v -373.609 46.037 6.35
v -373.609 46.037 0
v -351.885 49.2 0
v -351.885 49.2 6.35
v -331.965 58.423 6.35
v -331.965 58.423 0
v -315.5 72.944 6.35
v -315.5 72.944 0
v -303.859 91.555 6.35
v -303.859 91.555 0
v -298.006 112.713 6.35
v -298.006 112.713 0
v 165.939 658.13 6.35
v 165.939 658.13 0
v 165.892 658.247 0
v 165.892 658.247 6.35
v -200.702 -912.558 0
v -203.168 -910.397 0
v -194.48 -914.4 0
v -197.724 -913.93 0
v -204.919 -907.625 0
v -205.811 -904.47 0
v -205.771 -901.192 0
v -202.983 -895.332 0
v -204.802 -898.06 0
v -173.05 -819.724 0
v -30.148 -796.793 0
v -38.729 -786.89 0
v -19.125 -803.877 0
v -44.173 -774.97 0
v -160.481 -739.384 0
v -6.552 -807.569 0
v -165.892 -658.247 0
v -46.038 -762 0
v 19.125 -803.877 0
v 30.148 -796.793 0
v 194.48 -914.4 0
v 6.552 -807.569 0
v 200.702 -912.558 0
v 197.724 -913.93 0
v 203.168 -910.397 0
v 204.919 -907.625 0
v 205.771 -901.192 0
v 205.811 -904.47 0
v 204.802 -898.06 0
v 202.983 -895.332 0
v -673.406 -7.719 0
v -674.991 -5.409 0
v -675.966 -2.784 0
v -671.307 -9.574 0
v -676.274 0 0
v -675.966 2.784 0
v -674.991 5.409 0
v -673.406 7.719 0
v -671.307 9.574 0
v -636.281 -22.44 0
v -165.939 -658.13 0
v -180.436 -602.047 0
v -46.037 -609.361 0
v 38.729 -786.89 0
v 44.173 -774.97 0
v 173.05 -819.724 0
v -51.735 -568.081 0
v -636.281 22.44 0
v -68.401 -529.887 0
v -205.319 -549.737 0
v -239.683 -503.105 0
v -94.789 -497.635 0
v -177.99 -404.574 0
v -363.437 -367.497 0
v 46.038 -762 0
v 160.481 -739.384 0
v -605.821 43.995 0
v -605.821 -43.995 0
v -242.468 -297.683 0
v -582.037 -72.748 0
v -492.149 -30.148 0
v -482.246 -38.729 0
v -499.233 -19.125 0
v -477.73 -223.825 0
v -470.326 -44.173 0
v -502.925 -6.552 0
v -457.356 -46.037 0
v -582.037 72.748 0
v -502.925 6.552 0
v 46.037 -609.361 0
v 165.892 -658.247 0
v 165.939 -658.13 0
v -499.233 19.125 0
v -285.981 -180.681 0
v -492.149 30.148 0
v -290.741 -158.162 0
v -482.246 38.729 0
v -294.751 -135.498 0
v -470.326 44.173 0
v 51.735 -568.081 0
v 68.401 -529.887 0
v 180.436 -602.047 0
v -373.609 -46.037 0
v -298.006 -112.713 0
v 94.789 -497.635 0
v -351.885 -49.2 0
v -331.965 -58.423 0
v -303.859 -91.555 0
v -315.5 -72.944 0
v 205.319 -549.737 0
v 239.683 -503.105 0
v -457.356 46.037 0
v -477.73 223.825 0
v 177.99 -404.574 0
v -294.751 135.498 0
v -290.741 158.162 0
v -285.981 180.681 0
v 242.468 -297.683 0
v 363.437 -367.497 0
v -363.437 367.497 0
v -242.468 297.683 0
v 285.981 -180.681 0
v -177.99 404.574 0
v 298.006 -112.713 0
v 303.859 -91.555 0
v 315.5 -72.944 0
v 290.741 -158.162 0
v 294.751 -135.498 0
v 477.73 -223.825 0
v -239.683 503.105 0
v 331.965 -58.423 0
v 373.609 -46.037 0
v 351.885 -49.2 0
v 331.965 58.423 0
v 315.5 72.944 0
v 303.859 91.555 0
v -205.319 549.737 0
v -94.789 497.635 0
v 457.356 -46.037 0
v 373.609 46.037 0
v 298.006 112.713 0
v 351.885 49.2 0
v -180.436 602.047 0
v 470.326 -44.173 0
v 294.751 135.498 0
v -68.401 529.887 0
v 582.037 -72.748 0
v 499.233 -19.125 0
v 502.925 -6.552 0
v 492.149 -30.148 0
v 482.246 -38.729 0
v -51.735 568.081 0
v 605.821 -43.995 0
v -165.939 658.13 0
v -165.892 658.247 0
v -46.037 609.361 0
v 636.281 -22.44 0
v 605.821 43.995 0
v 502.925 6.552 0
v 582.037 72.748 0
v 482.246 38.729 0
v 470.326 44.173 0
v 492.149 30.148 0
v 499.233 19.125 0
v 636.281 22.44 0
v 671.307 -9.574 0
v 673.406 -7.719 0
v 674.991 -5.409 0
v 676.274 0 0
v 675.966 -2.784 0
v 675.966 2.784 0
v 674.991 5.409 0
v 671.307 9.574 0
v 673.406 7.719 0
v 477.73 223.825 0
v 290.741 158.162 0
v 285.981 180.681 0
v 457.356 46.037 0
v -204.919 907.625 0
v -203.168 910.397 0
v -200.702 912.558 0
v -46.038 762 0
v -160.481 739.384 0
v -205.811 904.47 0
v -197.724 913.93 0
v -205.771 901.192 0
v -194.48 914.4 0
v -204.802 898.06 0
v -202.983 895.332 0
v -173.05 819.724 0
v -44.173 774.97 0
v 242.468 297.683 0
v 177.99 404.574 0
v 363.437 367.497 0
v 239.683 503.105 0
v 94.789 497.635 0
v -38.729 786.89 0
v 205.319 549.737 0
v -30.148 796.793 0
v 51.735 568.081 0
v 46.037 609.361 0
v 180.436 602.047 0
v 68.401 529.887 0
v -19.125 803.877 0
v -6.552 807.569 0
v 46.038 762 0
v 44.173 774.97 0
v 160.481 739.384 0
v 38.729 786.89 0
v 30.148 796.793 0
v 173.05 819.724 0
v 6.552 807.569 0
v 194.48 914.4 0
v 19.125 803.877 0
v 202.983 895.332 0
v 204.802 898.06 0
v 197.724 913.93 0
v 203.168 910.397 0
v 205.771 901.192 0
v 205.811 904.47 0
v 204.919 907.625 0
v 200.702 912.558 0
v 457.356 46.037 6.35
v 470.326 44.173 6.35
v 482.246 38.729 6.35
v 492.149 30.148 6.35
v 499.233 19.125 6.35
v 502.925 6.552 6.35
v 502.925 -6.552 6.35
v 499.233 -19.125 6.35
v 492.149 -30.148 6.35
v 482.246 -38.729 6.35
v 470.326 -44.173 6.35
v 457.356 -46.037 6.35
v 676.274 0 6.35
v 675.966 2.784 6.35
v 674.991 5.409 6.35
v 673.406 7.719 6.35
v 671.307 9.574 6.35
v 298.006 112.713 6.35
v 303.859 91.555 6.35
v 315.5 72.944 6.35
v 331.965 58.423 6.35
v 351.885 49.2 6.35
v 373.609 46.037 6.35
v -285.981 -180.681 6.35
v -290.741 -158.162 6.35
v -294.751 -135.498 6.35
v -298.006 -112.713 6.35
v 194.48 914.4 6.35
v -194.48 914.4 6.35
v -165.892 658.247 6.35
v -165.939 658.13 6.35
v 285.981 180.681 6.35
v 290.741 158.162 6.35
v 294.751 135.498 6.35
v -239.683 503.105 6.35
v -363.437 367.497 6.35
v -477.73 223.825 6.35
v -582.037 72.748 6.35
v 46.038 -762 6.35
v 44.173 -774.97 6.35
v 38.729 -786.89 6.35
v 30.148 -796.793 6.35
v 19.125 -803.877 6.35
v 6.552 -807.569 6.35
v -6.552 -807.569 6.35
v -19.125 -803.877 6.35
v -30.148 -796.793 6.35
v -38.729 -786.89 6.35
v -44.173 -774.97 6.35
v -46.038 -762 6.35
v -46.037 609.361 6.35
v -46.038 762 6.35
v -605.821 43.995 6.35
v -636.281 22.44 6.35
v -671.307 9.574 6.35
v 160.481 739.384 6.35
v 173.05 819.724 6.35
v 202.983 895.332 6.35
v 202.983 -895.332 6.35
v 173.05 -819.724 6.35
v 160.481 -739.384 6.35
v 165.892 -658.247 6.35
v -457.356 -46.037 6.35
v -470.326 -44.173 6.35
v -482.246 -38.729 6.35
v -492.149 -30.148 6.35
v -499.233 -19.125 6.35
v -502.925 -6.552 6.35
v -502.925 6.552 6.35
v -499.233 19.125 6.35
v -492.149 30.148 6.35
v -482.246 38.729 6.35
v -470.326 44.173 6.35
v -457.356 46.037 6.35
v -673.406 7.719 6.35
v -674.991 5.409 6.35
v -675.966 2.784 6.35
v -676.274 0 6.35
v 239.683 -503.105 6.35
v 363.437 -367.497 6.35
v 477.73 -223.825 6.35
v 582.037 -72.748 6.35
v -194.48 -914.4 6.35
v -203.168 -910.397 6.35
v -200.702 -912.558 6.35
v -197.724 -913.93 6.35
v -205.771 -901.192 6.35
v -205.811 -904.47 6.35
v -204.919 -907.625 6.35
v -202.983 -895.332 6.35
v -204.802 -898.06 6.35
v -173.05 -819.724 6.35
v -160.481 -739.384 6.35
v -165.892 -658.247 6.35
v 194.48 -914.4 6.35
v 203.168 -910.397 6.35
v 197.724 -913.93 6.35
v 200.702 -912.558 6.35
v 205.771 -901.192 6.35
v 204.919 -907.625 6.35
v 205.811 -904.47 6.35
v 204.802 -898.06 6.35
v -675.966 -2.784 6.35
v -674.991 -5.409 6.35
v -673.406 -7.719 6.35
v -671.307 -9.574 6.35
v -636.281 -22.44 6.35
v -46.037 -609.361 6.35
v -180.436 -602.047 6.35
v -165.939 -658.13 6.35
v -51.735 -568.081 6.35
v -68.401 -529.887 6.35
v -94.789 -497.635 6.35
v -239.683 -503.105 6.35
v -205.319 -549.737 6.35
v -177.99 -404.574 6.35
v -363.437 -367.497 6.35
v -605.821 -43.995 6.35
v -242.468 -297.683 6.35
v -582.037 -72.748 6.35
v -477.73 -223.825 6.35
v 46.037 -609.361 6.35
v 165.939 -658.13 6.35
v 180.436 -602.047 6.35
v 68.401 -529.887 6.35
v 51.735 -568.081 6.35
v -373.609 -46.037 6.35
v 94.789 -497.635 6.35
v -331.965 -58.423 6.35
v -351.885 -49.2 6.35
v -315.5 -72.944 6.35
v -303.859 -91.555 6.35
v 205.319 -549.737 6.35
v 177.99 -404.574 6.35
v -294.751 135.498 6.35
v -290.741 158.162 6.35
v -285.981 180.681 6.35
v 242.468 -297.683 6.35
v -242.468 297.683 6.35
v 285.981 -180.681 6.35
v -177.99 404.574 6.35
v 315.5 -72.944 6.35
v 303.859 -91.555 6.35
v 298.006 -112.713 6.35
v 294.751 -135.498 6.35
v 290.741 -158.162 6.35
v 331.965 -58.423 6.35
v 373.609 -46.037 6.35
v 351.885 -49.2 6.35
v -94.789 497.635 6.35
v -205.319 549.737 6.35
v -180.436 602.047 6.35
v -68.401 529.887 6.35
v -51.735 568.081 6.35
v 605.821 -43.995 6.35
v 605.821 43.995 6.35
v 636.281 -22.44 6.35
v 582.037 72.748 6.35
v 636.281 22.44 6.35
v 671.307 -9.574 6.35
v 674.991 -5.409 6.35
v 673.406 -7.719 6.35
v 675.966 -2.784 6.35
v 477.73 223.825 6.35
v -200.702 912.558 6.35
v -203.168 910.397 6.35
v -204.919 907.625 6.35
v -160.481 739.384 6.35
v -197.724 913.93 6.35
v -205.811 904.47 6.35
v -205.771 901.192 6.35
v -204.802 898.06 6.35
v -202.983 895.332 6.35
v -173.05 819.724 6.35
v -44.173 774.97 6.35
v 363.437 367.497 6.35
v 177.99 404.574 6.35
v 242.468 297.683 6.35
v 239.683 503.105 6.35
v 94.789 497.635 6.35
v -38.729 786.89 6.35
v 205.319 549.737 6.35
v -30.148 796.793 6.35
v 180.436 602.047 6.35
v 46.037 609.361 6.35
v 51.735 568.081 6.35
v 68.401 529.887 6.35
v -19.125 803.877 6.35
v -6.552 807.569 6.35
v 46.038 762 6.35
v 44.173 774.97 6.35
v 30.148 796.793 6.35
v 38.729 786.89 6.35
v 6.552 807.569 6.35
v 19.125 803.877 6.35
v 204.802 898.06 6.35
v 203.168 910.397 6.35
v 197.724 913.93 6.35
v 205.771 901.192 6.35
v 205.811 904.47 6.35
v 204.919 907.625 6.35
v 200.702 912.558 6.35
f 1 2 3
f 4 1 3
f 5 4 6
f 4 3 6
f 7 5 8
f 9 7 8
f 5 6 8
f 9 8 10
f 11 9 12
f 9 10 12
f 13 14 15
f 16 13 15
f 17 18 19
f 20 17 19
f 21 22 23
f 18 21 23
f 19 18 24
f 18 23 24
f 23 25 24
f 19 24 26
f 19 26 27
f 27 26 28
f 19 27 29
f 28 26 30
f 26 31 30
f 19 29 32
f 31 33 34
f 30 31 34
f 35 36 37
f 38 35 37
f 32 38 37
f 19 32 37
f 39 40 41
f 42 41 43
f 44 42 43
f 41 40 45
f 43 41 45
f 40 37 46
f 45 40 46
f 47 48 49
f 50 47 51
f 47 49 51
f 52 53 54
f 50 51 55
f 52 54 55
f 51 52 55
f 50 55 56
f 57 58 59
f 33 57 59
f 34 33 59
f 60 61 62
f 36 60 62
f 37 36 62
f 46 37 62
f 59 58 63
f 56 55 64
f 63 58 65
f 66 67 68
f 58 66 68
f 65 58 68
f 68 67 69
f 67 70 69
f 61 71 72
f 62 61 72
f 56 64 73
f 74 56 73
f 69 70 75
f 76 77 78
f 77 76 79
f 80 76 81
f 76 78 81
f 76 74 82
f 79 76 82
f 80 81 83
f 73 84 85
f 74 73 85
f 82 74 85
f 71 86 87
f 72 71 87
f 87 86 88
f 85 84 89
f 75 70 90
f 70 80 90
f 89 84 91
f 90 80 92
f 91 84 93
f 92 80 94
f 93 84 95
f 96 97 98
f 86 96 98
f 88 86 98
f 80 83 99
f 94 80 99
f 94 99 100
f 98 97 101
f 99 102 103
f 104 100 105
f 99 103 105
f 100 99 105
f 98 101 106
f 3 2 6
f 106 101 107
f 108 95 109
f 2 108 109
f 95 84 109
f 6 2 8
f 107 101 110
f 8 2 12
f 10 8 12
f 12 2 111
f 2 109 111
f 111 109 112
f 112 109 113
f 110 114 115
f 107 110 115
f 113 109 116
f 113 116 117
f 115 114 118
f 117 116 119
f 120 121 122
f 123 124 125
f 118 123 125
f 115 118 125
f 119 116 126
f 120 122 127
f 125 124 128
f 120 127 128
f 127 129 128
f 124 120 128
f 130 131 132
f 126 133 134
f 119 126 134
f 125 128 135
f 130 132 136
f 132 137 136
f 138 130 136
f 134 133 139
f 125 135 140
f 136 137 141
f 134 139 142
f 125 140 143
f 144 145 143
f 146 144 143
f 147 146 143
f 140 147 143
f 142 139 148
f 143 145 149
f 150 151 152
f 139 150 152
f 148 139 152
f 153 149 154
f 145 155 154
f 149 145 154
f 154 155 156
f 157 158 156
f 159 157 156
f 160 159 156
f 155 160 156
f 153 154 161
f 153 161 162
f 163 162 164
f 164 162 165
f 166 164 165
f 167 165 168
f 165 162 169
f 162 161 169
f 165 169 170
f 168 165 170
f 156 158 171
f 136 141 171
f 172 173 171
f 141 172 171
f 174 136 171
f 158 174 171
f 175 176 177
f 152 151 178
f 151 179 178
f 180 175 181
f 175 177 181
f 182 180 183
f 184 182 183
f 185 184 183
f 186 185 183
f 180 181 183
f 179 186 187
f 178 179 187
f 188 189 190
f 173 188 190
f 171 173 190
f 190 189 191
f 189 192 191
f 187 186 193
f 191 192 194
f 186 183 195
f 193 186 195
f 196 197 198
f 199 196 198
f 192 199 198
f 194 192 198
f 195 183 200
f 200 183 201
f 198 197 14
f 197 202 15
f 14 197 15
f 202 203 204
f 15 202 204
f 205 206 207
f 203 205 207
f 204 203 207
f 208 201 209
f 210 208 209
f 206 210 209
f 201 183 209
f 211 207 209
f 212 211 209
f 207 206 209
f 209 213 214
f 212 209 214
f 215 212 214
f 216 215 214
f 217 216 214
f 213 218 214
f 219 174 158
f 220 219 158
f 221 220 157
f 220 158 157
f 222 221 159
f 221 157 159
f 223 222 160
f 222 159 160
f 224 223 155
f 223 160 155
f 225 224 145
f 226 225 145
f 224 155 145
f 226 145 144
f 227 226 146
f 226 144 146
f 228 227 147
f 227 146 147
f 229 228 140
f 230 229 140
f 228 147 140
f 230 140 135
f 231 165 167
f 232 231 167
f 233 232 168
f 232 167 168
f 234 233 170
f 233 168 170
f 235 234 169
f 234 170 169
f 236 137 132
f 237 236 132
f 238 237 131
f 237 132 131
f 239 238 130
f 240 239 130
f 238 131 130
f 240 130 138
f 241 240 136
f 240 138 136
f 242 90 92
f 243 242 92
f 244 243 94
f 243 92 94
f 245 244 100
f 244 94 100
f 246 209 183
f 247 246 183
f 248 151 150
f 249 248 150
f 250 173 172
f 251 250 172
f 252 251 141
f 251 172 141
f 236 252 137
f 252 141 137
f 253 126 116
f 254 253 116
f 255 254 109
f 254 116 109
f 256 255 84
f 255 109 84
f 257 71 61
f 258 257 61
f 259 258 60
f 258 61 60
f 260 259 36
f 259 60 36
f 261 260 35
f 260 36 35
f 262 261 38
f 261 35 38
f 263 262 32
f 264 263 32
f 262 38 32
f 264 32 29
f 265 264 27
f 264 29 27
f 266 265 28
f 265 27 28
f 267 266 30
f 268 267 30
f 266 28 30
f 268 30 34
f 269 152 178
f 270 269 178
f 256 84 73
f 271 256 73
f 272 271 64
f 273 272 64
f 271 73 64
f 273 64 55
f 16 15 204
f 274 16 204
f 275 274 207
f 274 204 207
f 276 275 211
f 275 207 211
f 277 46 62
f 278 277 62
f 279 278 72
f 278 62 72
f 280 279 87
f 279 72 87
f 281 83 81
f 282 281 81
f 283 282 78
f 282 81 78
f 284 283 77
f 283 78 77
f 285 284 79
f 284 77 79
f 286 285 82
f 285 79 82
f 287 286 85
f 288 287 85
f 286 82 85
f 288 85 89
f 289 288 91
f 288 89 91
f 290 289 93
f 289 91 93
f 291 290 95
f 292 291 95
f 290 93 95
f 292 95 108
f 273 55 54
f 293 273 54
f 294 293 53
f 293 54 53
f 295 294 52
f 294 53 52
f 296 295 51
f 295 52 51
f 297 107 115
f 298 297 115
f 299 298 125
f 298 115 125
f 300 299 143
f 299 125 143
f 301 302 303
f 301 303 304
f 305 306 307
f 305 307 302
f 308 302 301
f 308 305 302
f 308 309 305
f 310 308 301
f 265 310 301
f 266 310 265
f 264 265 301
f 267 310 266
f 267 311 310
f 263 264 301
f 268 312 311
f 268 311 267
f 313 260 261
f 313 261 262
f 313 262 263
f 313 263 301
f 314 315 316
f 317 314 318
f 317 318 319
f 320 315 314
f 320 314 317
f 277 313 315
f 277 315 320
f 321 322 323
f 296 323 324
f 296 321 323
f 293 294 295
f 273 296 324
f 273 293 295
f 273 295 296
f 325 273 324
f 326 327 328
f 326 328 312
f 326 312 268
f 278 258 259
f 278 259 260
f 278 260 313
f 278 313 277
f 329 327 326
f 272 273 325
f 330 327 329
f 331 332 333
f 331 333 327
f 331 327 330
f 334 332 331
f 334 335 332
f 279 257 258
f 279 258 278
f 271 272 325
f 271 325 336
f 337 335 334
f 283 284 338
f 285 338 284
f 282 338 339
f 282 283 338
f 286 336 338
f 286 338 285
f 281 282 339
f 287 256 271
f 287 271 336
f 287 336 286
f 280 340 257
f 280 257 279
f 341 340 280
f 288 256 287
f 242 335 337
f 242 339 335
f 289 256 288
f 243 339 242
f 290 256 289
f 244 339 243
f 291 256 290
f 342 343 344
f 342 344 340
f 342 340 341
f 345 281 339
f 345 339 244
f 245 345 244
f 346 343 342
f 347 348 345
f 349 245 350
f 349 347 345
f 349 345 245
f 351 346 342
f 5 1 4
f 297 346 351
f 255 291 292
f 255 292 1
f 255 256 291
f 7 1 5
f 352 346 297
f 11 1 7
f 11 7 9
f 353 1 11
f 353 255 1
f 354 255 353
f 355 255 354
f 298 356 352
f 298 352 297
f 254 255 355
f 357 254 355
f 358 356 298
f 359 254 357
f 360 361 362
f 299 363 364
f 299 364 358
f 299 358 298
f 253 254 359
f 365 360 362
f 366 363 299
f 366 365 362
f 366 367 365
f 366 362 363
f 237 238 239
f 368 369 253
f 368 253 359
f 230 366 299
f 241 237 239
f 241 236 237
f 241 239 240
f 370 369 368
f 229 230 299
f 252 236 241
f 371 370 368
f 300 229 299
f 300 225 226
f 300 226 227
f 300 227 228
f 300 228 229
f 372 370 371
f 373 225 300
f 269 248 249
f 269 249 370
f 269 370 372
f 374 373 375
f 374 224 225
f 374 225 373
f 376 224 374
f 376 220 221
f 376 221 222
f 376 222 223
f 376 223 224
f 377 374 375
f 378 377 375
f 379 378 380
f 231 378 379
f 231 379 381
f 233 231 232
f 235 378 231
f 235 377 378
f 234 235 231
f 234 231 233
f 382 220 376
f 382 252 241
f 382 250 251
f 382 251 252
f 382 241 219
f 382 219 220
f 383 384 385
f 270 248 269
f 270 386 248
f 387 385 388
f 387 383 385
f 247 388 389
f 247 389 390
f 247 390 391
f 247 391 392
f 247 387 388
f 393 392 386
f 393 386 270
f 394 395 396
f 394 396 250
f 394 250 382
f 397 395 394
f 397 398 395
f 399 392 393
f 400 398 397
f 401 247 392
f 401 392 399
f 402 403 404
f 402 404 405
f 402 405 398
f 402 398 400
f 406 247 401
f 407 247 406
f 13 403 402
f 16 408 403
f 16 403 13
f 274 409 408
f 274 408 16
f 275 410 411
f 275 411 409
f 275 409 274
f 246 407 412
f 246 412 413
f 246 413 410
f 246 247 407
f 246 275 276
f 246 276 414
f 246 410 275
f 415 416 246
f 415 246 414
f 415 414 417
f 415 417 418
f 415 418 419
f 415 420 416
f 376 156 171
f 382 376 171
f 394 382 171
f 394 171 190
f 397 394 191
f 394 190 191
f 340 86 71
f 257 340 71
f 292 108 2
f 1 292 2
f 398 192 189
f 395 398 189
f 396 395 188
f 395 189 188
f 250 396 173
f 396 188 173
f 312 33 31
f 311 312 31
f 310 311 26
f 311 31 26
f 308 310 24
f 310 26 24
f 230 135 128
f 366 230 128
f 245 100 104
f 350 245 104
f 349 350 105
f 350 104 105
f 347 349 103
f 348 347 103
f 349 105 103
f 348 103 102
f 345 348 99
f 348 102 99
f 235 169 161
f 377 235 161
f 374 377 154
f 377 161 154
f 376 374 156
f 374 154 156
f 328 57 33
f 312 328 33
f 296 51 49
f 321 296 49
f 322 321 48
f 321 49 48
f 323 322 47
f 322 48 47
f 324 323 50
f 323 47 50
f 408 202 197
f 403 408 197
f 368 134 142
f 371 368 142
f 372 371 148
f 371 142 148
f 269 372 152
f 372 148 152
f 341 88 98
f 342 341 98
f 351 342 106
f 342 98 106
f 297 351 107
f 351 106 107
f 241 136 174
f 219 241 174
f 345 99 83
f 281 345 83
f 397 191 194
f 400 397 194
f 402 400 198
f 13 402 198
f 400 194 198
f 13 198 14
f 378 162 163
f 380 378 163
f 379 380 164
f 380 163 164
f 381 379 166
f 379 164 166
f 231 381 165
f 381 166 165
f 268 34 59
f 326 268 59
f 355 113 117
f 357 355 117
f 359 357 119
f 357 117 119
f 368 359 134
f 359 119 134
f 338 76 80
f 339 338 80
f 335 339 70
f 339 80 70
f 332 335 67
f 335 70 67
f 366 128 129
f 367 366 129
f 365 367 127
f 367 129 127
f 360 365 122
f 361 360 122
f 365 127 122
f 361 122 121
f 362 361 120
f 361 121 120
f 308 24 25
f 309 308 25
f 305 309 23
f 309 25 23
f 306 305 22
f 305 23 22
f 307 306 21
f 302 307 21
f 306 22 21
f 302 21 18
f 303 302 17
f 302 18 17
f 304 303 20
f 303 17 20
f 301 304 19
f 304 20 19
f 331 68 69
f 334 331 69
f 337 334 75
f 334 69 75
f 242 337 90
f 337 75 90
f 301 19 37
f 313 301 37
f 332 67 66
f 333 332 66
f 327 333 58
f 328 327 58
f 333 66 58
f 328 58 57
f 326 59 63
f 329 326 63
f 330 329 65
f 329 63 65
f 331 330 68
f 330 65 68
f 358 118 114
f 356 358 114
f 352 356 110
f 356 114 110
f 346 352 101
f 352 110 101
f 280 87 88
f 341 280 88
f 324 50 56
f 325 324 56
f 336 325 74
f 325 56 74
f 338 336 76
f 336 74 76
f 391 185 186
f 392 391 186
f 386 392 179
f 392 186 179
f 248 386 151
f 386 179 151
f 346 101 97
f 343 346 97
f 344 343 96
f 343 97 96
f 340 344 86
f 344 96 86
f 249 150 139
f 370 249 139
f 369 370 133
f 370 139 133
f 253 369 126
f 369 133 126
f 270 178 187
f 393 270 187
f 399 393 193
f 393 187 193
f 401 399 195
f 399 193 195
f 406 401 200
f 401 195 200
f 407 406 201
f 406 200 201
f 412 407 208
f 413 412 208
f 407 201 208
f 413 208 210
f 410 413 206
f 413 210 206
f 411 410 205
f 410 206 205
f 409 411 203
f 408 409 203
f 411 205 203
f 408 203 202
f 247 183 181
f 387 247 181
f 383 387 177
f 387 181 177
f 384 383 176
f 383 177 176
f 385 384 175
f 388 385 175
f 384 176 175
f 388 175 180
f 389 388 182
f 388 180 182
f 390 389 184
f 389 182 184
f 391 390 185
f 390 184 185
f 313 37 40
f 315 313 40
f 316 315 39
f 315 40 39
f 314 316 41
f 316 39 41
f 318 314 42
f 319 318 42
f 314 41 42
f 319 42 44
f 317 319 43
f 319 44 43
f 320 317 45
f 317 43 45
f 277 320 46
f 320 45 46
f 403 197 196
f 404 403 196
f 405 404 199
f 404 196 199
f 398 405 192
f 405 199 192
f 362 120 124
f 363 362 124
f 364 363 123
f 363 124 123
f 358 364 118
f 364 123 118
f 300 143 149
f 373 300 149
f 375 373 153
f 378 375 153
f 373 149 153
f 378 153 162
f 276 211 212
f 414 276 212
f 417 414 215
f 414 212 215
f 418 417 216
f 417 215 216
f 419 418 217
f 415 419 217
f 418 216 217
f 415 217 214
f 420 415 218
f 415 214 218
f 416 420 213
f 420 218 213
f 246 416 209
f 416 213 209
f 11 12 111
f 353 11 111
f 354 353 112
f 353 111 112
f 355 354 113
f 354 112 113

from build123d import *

# Parameters (mm, degrees)
BOSS_EXTRUDE1_DEPTH = 6.35


with BuildPart() as part:
    # Model → Boss-Extrude1 (new body)
    with BuildSketch(Plane.XY):
        with BuildLine():
            Line((-1e-09, 914.4), (-194.479849893, 914.4))
            ThreePointArc((-194.479849893, 914.4), (-204.918872942, 907.625287079), (-202.98320057, 895.332073104))
            ThreePointArc((-202.98320057, 895.332073104), (-164.535916974, 779.903104595), (-165.892020398, 658.247026365))
            Line((-165.892020398, 658.247026365), (-165.93888619, 658.129795087))
            ThreePointArc((-165.93888619, 658.129795087), (-191.627212467, 575.297388544), (-239.683438481, 503.105305724))
            ThreePointArc((-239.683438481, 503.105305724), (-421.799875665, 296.628923535), (-582.037423101, 72.747657041))
            ThreePointArc((-582.037423101, 72.747657041), (-620.33909224, 32.211350911), (-671.307126154, 9.573561873))
            ThreePointArc((-671.307126154, 9.573561873), (-674.990888605, 5.409489793), (-676.274252254, 0))
            ThreePointArc((-676.274252254, 0), (-674.990888605, -5.409489793), (-671.307126154, -9.573561873))
            ThreePointArc((-671.307126154, -9.573561873), (-620.33909224, -32.211350911), (-582.037423101, -72.747657041))
            ThreePointArc((-582.037423101, -72.747657041), (-421.799875665, -296.628923535), (-239.683438481, -503.105305724))
            ThreePointArc((-239.683438481, -503.105305724), (-191.627212467, -575.297388544), (-165.93888619, -658.129795087))
            Line((-165.93888619, -658.129795087), (-165.892020398, -658.247026365))
            ThreePointArc((-165.892020398, -658.247026365), (-164.535916974, -779.903104595), (-202.98320057, -895.332073104))
            ThreePointArc((-202.98320057, -895.332073104), (-204.918872942, -907.625287079), (-194.479849893, -914.4))
            Line((-194.479849893, -914.4), (-1e-09, -914.4))
            Line((-1e-09, -914.4), (194.47984989, -914.4))
            ThreePointArc((194.47984989, -914.4), (204.918872939, -907.625287079), (202.983200567, -895.332073104))
            ThreePointArc((202.983200567, -895.332073104), (164.535916972, -779.903104595), (165.892020395, -658.247026365))
            Line((165.892020395, -658.247026365), (165.938886187, -658.129795086))
            ThreePointArc((165.938886187, -658.129795086), (191.627212464, -575.297388544), (239.683438478, -503.105305724))
            ThreePointArc((239.683438478, -503.105305724), (421.79987566, -296.628923537), (582.037423094, -72.747657046))
            ThreePointArc((582.037423094, -72.747657046), (620.339092235, -32.211350913), (671.307126151, -9.573561873))
            ThreePointArc((671.307126151, -9.573561873), (674.990888602, -5.409489793), (676.274252251, 0))
            ThreePointArc((676.274252251, 0), (674.990888602, 5.409489793), (671.307126151, 9.573561873))
            ThreePointArc((671.307126151, 9.573561873), (620.339092237, 32.211350911), (582.037423097, 72.747657043))
            ThreePointArc((582.037423097, 72.747657043), (421.799875662, 296.628923535), (239.683438478, 503.105305724))
            ThreePointArc((239.683438478, 503.105305724), (191.627212464, 575.297388544), (165.938886187, 658.129795087))
            Line((165.938886187, 658.129795087), (165.892020395, 658.247026365))
            ThreePointArc((165.892020395, 658.247026365), (164.535916972, 779.903104595), (202.983200567, 895.332073104))
            ThreePointArc((202.983200567, 895.332073104), (204.918872939, 907.625287079), (194.47984989, 914.4))
            Line((194.47984989, 914.4), (-1e-09, 914.4))
        make_face()
        with BuildLine():
            Line((-46.0375, -761.999999999), (-46.0375, -609.361109078))
            ThreePointArc((-46.0375, -609.361109078), (-58.756065659, -548.411483153), (-94.788902893, -497.634978214))
            ThreePointArc((-94.788902893, -497.634978214), (-212.726110253, -352.63455945), (-285.980677563, -180.680860187))
            ThreePointArc((-285.980677563, -180.680860187), (-292.839641189, -146.846450496), (-298.006194276, -112.712605264))
            ThreePointArc((-298.006194276, -112.712605264), (-323.20694899, -65.087535088), (-373.608551252, -46.0375))
            Line((-373.608551252, -46.0375), (-457.356144829, -46.0375))
            ThreePointArc((-457.356144829, -46.0375), (-503.393644829, 0), (-457.356144829, 46.0375))
            Line((-457.356144829, 46.0375), (-373.608551252, 46.0375))
            ThreePointArc((-373.608551252, 46.0375), (-323.20694899, 65.087535088), (-298.006194276, 112.712605264))
            ThreePointArc((-298.006194276, 112.712605264), (-292.839641189, 146.846450496), (-285.980677563, 180.680860188))
            ThreePointArc((-285.980677563, 180.680860188), (-212.726110253, 352.63455945), (-94.788902893, 497.634978214))
            ThreePointArc((-94.788902893, 497.634978214), (-58.756065659, 548.411483153), (-46.0375, 609.361109078))
            Line((-46.0375, 609.361109078), (-46.0375, 761.999999999))
            ThreePointArc((-46.0375, 761.999999999), (0, 808.037499999), (46.0375, 761.999999999))
            Line((46.0375, 761.999999999), (46.0375, 609.361109078))
            ThreePointArc((46.0375, 609.361109078), (58.756065659, 548.411483153), (94.788902893, 497.634978214))
            ThreePointArc((94.788902893, 497.634978214), (212.726110253, 352.63455945), (285.980677563, 180.680860188))
            ThreePointArc((285.980677563, 180.680860188), (292.839641189, 146.846450496), (298.006194276, 112.712605264))
            ThreePointArc((298.006194276, 112.712605264), (323.20694899, 65.087535088), (373.608551252, 46.0375))
            Line((373.608551252, 46.0375), (457.356144829, 46.0375))
            ThreePointArc((457.356144829, 46.0375), (503.393644829, 0), (457.356144829, -46.0375))
            Line((457.356144829, -46.0375), (373.608551252, -46.0375))
            ThreePointArc((373.608551252, -46.0375), (323.20694899, -65.087535088), (298.006194276, -112.712605264))
            ThreePointArc((298.006194276, -112.712605264), (292.839641189, -146.846450497), (285.980677563, -180.680860188))
            ThreePointArc((285.980677563, -180.680860188), (212.726110253, -352.63455945), (94.788902893, -497.634978214))
            ThreePointArc((94.788902893, -497.634978214), (58.756065659, -548.411483153), (46.0375, -609.361109078))
            Line((46.0375, -609.361109078), (46.0375, -761.999999999))
            ThreePointArc((46.0375, -761.999999999), (0, -808.037499999), (-46.0375, -761.999999999))
        make_face(mode=Mode.SUBTRACT)
    extrude(amount=BOSS_EXTRUDE1_DEPTH)


solid = part.part
